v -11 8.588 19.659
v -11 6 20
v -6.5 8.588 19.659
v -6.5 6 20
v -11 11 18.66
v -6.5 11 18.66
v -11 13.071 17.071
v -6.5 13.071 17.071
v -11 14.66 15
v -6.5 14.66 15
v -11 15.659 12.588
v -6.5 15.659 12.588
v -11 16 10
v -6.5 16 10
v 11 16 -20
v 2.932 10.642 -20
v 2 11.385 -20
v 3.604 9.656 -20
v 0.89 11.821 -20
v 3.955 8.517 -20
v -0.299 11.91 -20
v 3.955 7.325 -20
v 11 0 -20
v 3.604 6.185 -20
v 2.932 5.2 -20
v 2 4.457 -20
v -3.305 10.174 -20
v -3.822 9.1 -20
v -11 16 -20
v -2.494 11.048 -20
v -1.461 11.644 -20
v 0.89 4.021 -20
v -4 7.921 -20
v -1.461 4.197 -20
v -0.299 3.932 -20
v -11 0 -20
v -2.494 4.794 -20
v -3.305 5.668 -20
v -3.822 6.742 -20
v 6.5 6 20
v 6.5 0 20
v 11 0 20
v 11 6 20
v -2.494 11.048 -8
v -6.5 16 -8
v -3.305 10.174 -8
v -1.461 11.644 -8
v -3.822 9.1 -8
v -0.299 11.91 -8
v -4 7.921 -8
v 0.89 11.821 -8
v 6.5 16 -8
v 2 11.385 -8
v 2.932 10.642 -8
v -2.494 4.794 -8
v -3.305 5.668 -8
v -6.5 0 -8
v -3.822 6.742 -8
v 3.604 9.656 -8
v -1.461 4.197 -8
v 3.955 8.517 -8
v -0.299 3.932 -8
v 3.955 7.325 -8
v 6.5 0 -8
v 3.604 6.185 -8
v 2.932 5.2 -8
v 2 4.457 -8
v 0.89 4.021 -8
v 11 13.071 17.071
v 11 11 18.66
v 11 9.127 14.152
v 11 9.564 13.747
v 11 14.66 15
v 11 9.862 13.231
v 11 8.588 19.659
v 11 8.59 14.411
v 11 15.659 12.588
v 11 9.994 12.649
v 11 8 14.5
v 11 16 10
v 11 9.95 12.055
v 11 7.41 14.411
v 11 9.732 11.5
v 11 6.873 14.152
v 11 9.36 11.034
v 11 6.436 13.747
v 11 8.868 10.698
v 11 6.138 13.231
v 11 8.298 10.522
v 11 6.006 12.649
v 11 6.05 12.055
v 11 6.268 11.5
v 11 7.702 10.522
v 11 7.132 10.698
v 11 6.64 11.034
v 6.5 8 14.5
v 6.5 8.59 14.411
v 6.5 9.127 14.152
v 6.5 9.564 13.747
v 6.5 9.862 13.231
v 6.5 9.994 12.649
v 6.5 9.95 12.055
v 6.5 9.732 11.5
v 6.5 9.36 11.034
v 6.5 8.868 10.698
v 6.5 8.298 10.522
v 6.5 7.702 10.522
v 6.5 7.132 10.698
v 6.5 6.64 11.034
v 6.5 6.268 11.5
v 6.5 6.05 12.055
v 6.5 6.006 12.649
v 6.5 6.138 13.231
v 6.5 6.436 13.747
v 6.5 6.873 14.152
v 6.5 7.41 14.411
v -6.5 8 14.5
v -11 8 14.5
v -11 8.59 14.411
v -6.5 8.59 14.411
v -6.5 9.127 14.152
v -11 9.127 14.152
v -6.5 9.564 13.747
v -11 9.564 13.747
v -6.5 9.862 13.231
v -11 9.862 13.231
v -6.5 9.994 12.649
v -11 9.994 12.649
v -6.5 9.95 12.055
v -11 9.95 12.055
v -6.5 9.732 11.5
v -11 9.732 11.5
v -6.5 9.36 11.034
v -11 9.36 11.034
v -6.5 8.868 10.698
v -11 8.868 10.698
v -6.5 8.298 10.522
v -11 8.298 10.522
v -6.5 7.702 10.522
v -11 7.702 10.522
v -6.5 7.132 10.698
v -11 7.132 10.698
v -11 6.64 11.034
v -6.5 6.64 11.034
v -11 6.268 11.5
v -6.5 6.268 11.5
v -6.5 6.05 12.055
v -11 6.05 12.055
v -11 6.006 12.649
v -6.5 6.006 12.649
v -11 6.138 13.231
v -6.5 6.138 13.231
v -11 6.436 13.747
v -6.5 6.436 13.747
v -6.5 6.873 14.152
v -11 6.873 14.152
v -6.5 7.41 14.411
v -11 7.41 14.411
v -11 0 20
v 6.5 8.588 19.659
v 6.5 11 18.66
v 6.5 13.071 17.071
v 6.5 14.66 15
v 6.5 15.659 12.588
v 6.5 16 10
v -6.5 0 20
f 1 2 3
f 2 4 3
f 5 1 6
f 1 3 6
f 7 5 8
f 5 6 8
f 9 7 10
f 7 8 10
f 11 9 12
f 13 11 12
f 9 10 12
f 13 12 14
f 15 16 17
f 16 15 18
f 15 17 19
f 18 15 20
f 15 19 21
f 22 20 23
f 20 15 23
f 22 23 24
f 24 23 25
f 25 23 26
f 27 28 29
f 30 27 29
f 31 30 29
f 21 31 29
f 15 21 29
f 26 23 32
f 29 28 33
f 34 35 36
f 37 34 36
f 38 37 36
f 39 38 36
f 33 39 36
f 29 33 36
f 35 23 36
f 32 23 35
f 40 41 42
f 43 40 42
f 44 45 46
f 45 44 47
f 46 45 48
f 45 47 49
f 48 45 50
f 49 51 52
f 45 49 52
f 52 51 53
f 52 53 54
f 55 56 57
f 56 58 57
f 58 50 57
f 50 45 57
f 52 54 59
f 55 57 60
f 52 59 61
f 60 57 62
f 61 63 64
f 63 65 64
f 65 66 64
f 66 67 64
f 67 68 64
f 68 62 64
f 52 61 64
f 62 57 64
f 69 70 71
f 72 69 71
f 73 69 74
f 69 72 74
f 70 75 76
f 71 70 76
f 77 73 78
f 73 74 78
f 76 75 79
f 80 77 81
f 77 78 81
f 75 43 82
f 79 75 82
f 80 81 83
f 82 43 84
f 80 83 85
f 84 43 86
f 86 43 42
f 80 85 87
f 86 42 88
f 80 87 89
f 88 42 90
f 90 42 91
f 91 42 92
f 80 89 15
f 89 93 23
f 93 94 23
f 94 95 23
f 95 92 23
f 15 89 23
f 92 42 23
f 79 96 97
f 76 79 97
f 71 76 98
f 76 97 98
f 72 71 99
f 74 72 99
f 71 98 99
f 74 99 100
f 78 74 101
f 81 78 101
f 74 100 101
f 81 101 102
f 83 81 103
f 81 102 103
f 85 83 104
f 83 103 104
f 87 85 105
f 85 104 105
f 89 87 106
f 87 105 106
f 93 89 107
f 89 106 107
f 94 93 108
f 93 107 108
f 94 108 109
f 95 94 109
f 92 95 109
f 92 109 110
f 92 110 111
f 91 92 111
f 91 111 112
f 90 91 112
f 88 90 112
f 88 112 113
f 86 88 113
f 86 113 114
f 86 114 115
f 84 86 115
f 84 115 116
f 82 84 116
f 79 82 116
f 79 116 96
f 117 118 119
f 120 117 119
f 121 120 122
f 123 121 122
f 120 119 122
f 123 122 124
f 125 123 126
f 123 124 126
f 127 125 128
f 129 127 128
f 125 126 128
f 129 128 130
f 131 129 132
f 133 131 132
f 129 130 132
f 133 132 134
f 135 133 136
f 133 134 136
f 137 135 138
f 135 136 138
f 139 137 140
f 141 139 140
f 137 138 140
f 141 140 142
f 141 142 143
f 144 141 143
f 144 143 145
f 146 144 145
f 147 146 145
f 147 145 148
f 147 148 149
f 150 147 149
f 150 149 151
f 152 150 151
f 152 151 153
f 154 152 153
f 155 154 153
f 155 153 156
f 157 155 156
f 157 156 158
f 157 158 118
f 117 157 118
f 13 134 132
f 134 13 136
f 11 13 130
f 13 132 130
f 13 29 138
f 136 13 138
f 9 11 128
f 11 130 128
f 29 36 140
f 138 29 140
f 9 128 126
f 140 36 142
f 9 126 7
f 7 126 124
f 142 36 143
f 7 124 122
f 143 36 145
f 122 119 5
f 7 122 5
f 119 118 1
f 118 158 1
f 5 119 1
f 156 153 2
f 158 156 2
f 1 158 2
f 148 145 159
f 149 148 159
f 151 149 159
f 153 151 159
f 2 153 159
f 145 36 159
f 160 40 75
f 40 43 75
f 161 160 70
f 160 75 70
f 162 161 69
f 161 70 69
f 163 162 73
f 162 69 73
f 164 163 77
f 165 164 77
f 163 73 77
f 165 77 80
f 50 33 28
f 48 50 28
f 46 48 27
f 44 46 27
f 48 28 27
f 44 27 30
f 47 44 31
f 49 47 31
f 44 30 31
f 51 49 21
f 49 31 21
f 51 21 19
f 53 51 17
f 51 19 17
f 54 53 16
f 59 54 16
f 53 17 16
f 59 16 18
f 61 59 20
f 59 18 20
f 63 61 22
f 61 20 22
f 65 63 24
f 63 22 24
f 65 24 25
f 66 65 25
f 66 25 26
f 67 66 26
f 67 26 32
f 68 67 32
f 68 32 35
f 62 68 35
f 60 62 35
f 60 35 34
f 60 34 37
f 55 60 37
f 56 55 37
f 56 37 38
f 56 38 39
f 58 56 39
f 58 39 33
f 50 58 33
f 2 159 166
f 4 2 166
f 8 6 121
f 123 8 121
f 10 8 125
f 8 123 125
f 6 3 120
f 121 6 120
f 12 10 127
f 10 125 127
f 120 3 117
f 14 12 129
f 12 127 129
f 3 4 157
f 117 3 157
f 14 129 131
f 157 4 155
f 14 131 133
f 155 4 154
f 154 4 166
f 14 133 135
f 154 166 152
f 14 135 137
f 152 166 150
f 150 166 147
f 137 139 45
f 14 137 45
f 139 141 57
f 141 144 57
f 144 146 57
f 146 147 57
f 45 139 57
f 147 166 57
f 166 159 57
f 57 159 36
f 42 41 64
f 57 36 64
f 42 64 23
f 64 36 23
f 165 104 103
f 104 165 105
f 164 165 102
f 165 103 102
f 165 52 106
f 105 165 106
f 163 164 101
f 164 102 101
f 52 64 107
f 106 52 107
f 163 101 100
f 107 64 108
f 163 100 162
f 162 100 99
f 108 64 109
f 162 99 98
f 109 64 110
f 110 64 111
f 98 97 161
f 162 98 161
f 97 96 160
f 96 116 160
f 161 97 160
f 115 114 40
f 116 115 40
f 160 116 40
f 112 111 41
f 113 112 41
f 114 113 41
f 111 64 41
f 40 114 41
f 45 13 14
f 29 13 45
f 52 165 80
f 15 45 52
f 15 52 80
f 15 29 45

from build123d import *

# Parameters (mm, degrees)
BOSS_EXTRUDE1_DEPTH = 16
FILLET1_R           = 10
SKETCH2_R           = 4
CUT_EXTRUDE1_DEPTH  = 16
SKETCH3_R           = 2
CUT_EXTRUDE2_DEPTH  = 24


with BuildPart() as part:
    # Sketch1 → Boss-Extrude1 (new body)
    with BuildSketch(Plane(origin=(0, 0, 0), x_dir=(1, 0, 0), z_dir=(0, 1, 0))):
        Polygon((-11, 20), (-11, -20), (-6.5, -20), (-6.5, 8), (6.5, 8), (6.5, -20), (11, -20), (11, 20), align=None)
    extrude(amount=BOSS_EXTRUDE1_DEPTH)

    # Fillet1
    fillet1_edges = [part.edges().sort_by_distance(p)[0] for p in [
        (-8.75, 16, 20),
        (8.75, 16, 20),
    ]]
    fillet(fillet1_edges, radius=FILLET1_R)

    # Sketch2 → Cut-Extrude1 (cut)
    with BuildSketch(Plane(origin=(0, 0, -20), x_dir=(-1, 0, 0), z_dir=(0, 0, -1))):
        with Locations((0, 7.920875605)):
            Circle(SKETCH2_R)
    extrude(amount=-CUT_EXTRUDE1_DEPTH, mode=Mode.SUBTRACT)

    # Sketch3 → Cut-Extrude2 (cut)
    with BuildSketch(Plane.ZY.offset(11)):
        with Locations((12.5, 8)):
            Circle(SKETCH3_R)
    extrude(amount=-CUT_EXTRUDE2_DEPTH, mode=Mode.SUBTRACT)


solid = part.part
